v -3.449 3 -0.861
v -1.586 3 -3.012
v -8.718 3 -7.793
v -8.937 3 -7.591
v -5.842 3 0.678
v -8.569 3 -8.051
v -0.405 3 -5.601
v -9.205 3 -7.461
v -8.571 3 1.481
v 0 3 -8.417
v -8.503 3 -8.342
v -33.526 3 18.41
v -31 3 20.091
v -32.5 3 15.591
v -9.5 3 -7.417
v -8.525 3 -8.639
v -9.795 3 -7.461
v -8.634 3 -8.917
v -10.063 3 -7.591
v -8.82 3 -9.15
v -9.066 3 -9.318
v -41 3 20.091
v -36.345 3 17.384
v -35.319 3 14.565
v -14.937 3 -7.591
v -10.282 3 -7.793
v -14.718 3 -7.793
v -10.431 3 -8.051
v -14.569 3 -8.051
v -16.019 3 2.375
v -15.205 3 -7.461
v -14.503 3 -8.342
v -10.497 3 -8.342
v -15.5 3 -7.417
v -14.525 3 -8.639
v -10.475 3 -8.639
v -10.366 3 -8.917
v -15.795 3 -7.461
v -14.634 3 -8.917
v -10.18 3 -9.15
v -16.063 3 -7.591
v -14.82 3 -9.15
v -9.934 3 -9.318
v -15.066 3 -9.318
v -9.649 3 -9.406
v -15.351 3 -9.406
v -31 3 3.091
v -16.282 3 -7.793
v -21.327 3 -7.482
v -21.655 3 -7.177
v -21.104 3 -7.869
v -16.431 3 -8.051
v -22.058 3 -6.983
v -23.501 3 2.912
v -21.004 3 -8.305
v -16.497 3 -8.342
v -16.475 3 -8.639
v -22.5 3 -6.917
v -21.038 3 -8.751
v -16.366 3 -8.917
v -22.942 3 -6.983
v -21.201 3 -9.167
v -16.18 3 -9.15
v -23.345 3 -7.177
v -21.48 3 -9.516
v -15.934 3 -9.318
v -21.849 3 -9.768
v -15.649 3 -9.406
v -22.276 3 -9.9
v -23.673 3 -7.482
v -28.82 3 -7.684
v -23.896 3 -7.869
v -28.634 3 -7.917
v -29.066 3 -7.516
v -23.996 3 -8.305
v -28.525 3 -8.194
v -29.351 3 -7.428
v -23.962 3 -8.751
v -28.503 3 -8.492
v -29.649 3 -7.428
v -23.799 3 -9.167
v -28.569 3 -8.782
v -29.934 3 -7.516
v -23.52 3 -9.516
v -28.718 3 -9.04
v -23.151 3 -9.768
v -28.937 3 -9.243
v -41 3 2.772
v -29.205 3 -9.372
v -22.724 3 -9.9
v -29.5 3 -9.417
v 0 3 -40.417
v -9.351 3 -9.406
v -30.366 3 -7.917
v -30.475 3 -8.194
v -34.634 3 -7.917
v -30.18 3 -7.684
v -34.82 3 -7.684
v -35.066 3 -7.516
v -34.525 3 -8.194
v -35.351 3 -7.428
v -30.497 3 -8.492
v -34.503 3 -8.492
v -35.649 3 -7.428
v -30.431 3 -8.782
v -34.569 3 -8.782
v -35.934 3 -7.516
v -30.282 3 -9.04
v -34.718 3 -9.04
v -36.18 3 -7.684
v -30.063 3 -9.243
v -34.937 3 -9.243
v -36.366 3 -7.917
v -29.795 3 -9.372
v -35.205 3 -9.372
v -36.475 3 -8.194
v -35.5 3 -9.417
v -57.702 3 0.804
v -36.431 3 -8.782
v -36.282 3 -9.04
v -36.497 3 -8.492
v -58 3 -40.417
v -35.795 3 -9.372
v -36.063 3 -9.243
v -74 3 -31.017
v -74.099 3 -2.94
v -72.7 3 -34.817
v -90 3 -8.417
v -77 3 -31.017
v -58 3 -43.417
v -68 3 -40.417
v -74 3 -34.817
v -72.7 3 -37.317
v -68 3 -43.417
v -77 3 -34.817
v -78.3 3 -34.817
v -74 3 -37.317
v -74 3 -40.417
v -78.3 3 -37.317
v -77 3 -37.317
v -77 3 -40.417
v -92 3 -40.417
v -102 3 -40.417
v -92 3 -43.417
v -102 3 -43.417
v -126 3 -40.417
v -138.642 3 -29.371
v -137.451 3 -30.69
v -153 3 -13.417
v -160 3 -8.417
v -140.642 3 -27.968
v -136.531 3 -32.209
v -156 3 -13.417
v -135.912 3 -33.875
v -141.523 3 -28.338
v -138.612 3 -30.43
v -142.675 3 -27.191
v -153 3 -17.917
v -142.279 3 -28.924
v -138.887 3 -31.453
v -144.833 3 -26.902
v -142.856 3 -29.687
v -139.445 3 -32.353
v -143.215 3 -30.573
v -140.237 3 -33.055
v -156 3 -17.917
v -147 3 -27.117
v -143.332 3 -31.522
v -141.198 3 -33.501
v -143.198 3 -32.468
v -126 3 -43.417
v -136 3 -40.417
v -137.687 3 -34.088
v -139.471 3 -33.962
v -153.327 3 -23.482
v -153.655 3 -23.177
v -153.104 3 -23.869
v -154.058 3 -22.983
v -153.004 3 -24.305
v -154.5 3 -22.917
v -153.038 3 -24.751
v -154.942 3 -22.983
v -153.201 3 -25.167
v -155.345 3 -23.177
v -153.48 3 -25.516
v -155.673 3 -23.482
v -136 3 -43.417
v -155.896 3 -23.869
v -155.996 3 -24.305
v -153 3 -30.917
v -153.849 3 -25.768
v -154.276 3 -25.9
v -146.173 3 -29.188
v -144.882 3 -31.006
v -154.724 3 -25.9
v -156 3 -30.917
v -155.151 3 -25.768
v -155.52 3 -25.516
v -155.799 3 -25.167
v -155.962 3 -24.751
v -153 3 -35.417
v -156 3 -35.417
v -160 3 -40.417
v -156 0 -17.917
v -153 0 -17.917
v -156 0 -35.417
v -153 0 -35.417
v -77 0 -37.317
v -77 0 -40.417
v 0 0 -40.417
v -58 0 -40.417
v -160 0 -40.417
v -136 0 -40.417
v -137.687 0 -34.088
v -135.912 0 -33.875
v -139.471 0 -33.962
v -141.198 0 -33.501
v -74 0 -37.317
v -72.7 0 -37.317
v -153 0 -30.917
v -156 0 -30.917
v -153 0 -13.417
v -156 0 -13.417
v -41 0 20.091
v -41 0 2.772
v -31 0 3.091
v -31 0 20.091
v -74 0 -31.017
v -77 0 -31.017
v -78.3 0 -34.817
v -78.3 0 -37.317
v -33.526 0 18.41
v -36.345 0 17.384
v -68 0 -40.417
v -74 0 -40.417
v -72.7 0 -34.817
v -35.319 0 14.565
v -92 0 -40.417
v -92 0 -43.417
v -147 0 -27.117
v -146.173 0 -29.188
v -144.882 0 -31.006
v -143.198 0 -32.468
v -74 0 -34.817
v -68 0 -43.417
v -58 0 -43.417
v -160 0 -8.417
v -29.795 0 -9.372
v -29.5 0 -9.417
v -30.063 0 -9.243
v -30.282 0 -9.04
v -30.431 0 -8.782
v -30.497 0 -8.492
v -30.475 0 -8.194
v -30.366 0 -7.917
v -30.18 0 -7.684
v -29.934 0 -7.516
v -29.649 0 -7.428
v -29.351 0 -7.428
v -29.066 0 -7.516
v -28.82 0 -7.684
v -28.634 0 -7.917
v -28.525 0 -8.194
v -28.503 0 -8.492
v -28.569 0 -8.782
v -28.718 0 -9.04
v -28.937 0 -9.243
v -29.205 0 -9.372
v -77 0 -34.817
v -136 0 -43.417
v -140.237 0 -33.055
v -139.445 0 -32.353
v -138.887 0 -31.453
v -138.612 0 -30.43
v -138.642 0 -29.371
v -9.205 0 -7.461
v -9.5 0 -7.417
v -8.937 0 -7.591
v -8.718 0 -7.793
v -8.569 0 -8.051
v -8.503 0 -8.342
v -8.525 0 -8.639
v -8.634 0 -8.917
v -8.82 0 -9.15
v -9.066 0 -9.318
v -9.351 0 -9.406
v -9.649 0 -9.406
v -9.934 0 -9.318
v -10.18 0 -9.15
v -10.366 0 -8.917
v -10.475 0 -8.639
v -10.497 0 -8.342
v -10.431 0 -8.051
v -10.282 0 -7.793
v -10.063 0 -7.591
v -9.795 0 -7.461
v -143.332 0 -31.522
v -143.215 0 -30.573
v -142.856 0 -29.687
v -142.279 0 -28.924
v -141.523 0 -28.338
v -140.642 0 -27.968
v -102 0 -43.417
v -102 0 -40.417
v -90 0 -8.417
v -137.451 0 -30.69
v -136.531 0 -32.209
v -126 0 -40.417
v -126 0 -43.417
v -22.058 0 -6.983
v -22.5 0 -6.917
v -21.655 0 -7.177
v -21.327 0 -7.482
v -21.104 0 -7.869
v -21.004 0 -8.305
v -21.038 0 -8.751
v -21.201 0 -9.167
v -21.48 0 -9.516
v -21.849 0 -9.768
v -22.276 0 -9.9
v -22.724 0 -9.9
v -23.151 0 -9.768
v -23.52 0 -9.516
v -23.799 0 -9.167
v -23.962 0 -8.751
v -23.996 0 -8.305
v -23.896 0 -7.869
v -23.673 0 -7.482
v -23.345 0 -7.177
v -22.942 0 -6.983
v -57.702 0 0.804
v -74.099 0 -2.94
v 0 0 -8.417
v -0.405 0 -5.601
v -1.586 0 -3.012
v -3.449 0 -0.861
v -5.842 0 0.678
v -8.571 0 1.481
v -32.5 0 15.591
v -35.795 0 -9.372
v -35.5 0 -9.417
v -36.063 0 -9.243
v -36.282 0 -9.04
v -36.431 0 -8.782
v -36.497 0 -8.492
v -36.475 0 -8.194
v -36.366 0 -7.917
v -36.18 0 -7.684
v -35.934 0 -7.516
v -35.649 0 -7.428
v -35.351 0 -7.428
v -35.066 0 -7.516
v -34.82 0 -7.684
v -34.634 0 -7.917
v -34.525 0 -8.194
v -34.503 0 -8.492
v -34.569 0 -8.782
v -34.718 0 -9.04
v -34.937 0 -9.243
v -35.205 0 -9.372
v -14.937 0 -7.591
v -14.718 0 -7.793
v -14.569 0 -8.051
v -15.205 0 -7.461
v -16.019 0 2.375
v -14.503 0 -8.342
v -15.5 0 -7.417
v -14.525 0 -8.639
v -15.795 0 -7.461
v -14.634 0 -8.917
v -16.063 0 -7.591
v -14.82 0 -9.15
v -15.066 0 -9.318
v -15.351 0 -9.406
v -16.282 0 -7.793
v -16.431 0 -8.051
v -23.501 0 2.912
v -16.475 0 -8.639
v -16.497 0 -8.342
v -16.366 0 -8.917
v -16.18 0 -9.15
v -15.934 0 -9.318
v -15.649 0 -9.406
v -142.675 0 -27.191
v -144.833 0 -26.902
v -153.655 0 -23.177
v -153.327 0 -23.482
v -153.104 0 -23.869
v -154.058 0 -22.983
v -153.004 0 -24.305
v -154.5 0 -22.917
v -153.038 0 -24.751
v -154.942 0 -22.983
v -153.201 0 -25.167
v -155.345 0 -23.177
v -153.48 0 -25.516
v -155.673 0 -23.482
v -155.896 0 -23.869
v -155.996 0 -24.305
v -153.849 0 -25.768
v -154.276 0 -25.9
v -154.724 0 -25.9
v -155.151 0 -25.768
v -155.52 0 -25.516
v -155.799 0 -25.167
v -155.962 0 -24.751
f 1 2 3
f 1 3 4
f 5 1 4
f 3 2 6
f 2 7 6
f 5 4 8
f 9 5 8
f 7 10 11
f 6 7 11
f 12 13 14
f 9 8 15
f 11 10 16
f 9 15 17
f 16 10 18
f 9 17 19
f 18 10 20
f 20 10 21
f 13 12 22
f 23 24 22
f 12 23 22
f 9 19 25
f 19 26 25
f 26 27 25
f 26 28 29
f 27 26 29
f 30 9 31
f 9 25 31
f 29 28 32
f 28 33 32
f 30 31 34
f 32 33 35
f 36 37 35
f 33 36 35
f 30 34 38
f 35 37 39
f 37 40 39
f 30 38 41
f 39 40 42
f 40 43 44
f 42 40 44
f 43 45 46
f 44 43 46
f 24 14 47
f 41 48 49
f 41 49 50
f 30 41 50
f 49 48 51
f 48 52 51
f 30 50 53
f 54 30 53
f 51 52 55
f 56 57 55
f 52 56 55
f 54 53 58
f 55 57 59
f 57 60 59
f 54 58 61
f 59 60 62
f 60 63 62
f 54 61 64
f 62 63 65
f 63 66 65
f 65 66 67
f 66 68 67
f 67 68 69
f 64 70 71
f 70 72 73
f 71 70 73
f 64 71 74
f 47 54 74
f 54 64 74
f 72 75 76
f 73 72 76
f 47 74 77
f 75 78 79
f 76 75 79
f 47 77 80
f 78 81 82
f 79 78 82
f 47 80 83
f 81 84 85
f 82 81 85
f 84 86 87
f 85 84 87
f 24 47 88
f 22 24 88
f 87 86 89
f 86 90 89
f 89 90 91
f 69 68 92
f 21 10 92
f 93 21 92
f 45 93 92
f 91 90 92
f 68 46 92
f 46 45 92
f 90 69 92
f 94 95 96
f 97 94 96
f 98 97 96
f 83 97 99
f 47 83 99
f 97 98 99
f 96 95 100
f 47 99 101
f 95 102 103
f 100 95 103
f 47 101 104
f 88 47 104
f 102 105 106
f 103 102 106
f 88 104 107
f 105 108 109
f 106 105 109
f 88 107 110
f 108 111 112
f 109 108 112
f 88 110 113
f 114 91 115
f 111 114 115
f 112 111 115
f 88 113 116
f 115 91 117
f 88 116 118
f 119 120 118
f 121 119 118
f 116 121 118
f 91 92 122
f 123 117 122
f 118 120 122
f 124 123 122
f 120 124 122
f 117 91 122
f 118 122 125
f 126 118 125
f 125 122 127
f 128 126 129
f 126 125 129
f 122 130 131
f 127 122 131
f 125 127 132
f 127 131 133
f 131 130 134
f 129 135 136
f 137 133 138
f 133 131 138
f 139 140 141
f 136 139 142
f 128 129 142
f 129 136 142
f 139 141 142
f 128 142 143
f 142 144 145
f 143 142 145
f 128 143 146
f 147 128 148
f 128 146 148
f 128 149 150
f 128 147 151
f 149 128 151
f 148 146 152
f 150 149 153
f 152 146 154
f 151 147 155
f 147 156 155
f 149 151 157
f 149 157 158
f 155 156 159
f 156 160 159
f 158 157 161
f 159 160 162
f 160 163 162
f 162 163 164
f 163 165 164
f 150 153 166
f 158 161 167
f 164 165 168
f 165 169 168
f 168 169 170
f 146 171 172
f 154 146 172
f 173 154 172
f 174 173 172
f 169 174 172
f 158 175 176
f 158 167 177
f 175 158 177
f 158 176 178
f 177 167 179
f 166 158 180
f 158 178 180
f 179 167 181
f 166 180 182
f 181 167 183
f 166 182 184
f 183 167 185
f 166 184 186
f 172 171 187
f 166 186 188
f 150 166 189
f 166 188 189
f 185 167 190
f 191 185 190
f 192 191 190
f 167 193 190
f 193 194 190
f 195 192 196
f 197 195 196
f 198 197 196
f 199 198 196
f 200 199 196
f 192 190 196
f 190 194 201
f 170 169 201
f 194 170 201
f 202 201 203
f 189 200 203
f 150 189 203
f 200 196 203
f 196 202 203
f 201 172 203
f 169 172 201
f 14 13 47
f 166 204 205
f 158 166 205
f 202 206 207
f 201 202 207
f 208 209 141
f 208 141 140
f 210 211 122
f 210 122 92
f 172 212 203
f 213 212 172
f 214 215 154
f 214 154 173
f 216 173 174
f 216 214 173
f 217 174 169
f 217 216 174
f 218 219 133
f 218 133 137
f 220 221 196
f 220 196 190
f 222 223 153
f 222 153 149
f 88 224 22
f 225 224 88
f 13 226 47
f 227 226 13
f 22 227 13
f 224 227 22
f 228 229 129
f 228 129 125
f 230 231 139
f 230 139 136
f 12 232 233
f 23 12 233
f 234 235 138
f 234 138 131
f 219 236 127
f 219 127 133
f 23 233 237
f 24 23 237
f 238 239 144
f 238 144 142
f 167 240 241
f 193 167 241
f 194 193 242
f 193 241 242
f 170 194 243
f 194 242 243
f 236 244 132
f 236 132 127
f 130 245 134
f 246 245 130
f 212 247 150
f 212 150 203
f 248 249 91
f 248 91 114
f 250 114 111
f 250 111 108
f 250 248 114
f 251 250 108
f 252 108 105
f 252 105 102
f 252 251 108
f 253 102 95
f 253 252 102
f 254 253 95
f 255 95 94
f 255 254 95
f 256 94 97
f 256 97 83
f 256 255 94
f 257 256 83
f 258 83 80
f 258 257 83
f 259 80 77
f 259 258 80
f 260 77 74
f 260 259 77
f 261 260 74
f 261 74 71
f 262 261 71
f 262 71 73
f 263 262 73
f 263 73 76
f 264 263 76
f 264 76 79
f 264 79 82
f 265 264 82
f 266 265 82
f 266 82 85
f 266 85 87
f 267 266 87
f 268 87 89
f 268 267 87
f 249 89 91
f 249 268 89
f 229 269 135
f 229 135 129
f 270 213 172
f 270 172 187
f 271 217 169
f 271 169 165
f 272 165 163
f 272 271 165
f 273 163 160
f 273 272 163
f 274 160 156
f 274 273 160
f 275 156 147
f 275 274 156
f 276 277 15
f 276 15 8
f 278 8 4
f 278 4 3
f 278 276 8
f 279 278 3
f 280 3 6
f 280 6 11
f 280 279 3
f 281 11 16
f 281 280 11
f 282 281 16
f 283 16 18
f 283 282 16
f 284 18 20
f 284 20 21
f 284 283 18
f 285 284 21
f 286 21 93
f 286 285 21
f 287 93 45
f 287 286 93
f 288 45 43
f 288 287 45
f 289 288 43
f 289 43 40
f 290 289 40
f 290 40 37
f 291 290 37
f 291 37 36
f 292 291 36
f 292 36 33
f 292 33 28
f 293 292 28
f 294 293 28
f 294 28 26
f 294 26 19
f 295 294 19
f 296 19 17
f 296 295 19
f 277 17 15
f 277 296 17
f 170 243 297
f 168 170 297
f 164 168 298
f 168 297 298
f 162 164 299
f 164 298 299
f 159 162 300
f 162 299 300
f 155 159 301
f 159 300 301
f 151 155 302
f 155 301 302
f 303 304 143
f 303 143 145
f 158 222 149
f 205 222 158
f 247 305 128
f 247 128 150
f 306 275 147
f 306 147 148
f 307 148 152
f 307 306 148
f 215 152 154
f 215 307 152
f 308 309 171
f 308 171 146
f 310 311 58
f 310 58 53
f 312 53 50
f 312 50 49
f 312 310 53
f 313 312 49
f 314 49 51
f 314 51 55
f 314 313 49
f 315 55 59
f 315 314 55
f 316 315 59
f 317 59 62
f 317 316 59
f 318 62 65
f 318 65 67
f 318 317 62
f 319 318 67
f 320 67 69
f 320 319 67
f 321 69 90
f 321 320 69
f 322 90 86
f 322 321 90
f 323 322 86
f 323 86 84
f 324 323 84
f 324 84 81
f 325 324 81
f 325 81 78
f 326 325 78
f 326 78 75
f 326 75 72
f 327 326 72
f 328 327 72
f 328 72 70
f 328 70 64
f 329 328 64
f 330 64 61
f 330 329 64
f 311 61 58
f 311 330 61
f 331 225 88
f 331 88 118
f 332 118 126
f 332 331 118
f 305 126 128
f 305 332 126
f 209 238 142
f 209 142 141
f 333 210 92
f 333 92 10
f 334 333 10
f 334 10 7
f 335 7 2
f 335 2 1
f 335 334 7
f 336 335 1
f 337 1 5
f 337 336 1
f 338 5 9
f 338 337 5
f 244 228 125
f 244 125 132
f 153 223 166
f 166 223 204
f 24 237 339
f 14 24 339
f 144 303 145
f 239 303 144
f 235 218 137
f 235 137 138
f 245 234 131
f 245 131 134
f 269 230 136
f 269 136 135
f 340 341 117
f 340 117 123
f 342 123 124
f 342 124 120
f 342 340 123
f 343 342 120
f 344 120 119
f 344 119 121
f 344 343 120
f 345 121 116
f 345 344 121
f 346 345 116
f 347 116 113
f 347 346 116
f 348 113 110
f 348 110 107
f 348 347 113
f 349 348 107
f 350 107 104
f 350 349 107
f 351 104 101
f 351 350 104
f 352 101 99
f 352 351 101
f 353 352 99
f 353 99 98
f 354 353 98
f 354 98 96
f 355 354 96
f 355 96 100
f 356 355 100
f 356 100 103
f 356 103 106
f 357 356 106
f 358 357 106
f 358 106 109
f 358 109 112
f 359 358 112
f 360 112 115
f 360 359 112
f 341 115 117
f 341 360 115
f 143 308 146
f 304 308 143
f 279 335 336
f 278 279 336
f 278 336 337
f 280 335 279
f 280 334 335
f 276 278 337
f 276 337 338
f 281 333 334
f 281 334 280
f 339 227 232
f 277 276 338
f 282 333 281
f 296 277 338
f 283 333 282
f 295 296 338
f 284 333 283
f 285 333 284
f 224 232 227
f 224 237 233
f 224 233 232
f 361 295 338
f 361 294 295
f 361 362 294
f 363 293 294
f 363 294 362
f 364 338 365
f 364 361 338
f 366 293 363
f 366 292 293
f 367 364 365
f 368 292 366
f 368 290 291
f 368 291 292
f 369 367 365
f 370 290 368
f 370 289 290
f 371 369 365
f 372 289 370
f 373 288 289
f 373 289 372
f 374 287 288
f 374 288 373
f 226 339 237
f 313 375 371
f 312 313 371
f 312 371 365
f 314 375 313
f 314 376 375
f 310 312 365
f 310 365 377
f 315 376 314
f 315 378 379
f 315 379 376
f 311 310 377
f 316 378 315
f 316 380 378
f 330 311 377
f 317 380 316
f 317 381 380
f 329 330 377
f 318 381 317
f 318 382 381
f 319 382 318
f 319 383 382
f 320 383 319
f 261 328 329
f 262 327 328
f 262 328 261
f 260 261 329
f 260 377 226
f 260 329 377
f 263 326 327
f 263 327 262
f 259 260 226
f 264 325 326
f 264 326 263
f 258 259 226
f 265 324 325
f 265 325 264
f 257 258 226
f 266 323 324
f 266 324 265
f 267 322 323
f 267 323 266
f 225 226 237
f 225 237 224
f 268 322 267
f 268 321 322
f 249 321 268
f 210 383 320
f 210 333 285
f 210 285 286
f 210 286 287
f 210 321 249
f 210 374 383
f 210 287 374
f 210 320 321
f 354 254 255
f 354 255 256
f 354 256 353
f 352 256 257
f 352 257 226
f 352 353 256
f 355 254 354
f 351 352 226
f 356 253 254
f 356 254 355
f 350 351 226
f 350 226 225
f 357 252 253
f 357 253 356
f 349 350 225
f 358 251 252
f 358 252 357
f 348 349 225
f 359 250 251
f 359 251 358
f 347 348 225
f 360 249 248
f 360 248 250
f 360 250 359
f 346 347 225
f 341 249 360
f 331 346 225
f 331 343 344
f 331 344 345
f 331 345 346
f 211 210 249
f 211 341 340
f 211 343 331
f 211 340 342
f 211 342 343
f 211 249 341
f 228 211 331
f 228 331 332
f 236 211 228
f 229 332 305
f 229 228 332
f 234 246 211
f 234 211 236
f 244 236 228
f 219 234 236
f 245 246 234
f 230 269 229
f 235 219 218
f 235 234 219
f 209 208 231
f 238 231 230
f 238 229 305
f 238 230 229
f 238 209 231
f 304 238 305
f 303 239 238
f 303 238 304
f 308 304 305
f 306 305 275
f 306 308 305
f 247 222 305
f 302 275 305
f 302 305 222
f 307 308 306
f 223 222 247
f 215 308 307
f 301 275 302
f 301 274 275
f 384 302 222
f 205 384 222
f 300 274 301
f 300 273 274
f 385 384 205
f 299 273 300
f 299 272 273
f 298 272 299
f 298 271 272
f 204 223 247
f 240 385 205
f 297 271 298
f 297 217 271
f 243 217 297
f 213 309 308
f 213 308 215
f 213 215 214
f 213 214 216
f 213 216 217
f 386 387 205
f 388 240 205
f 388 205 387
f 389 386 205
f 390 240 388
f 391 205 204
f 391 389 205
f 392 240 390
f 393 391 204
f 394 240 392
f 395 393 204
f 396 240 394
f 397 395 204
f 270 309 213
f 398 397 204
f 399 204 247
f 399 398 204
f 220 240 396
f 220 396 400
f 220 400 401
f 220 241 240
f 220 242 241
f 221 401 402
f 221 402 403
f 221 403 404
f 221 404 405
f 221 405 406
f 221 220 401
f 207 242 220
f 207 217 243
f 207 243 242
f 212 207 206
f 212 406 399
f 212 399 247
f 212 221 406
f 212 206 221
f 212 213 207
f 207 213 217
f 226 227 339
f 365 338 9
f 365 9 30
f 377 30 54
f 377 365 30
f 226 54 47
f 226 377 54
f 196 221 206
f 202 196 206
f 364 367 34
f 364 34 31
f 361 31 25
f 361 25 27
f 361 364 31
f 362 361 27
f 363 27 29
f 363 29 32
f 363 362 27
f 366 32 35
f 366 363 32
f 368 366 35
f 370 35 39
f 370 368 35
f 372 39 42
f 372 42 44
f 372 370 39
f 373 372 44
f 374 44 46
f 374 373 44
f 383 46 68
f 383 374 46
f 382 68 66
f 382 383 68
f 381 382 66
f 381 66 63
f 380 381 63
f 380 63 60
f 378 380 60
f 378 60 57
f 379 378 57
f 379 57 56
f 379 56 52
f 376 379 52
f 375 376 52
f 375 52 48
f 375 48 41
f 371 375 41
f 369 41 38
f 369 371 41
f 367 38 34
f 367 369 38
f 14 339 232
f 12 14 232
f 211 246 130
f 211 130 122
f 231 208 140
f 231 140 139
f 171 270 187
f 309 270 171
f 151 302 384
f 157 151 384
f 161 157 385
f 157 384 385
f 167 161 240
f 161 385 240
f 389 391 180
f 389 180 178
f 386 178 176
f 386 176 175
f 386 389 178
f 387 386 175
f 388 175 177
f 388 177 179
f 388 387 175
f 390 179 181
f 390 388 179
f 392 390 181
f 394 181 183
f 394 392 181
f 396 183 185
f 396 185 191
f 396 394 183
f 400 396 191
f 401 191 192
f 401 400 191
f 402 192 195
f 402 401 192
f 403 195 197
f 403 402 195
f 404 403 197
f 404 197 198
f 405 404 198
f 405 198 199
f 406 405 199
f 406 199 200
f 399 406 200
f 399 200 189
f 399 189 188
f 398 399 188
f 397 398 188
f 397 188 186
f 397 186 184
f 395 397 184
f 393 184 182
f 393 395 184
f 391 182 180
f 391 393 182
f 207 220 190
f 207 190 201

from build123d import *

# Parameters (mm, degrees)
SKETCH2_R           = 1.5
SKETCH2_R_2         = 1
SKETCH2_W           = 3
SKETCH2_H           = 4.5
BOSS_EXTRUDE1_DEPTH = 3


with BuildPart() as part:
    # Sketch2 → Boss-Extrude1 (new body)
    with BuildSketch(Plane(origin=(0, 0, 0), x_dir=(1, 0, 0), z_dir=(0, 1, 0))):
        with BuildLine():
            Line((-90, 8.416796225), (-160, 8.416796225))
            Line((-160, 8.416796225), (-160, 40.416796225))
            Line((-160, 40.416796225), (-136, 40.416796225))
            Line((-136, 40.416796225), (-136, 43.416796225))
            Line((-136, 43.416796225), (-126, 43.416796225))
            Line((-126, 43.416796225), (-126, 40.416796225))
            Line((-126, 40.416796225), (-102, 40.416796225))
            Line((-102, 40.416796225), (-102, 43.416796225))
            Line((-102, 43.416796225), (-92, 43.416796225))
            Line((-92, 43.416796225), (-92, 40.416796225))
            Line((-92, 40.416796225), (-77, 40.416796225))
            Line((-77, 40.416796225), (-77, 37.316796225))
            Line((-77, 37.316796225), (-78.3, 37.316796225))
            Line((-78.3, 37.316796225), (-78.3, 34.816796225))
            Line((-78.3, 34.816796225), (-77, 34.816796225))
            Line((-77, 34.816796225), (-77, 31.016796225))
            Line((-77, 31.016796225), (-74, 31.016796225))
            Line((-74, 31.016796225), (-74, 34.816796225))
            Line((-74, 34.816796225), (-72.7, 34.816796225))
            Line((-72.7, 34.816796225), (-72.7, 37.316796225))
            Line((-72.7, 37.316796225), (-74, 37.316796225))
            Line((-74, 37.316796225), (-74, 40.416796225))
            Line((-74, 40.416796225), (-68, 40.416796225))
            Line((-68, 40.416796225), (-68, 43.416796225))
            Line((-68, 43.416796225), (-58, 43.416796225))
            Line((-58, 43.416796225), (-58, 40.416796225))
            Line((-58, 40.416796225), (0, 40.416796225))
            Line((0, 40.416796225), (0, 8.416796225))
            ThreePointArc((0, 8.416796225), (-2.44071054, 1.870259518), (-8.571428571, -1.480636961))
            ThreePointArc((-8.571428571, -1.480636961), (-19.756847872, -2.687843732), (-31, -3.090935939))
            Line((-31, -3.090935939), (-31, -20.090935939))
            Line((-31, -20.090935939), (-41, -20.090935939))
            Line((-41, -20.090935939), (-41, -2.772140939))
            ThreePointArc((-41, -2.772140939), (-65.95065205, 0.848775542), (-90, 8.416796225))
        make_face()
        with Locations(Location((-22.5, 8.416796225, 0), (0, 0, 270))):
            Circle(SKETCH2_R, mode=Mode.SUBTRACT)
        with Locations(Location((-15.5, 8.416796225, 0), (0, 0, 270))):
            Circle(SKETCH2_R_2, mode=Mode.SUBTRACT)
        with Locations(Location((-29.5, 8.416796225, 0), (0, 0, 90))):
            Circle(SKETCH2_R_2, mode=Mode.SUBTRACT)
        with Locations(Location((-9.5, 8.416796225, 0), (0, 0, 270))):
            Circle(SKETCH2_R_2, mode=Mode.SUBTRACT)
        with Locations(Location((-35.5, 8.416796225, 0), (0, 0, 90))):
            Circle(SKETCH2_R_2, mode=Mode.SUBTRACT)
        with Locations(Location((-154.5, 24.416796225, 0), (0, 0, 270))):
            Circle(SKETCH2_R, mode=Mode.SUBTRACT)
        with Locations((-154.5, 33.166796225)):
            Rectangle(SKETCH2_W, SKETCH2_H, mode=Mode.SUBTRACT)
        with Locations((-154.5, 15.666796225)):
            Rectangle(SKETCH2_W, SKETCH2_H, mode=Mode.SUBTRACT)
        Polygon((-32.5, -15.590935939), (-33.52606043, -18.410013802), (-36.345138292, -17.383953372), (-35.319077862, -14.564875509), align=None, mode=Mode.SUBTRACT)
        with BuildLine():
            ThreePointArc((-147, 27.116796225), (-145.581399645, 30.135325114), (-143.198066283, 32.468491571))
            ThreePointArc((-143.198066283, 32.468491571), (-142.855798146, 29.686729967), (-140.641525824, 27.968491571))
            ThreePointArc((-140.641525824, 27.968491571), (-143.745857333, 26.98342376), (-147, 27.116796225))
        make_face(mode=Mode.SUBTRACT)
        with BuildLine():
            ThreePointArc((-141.198066283, 33.500603039), (-139.132957266, 31.923161808), (-138.641525824, 29.371399432))
            ThreePointArc((-138.641525824, 29.371399432), (-136.955030568, 31.428045885), (-135.912116211, 33.874756027))
            ThreePointArc((-135.912116211, 33.874756027), (-138.582002565, 34.067876633), (-141.198066283, 33.500603039))
        make_face(mode=Mode.SUBTRACT)
    extrude(amount=BOSS_EXTRUDE1_DEPTH)


solid = part.part
